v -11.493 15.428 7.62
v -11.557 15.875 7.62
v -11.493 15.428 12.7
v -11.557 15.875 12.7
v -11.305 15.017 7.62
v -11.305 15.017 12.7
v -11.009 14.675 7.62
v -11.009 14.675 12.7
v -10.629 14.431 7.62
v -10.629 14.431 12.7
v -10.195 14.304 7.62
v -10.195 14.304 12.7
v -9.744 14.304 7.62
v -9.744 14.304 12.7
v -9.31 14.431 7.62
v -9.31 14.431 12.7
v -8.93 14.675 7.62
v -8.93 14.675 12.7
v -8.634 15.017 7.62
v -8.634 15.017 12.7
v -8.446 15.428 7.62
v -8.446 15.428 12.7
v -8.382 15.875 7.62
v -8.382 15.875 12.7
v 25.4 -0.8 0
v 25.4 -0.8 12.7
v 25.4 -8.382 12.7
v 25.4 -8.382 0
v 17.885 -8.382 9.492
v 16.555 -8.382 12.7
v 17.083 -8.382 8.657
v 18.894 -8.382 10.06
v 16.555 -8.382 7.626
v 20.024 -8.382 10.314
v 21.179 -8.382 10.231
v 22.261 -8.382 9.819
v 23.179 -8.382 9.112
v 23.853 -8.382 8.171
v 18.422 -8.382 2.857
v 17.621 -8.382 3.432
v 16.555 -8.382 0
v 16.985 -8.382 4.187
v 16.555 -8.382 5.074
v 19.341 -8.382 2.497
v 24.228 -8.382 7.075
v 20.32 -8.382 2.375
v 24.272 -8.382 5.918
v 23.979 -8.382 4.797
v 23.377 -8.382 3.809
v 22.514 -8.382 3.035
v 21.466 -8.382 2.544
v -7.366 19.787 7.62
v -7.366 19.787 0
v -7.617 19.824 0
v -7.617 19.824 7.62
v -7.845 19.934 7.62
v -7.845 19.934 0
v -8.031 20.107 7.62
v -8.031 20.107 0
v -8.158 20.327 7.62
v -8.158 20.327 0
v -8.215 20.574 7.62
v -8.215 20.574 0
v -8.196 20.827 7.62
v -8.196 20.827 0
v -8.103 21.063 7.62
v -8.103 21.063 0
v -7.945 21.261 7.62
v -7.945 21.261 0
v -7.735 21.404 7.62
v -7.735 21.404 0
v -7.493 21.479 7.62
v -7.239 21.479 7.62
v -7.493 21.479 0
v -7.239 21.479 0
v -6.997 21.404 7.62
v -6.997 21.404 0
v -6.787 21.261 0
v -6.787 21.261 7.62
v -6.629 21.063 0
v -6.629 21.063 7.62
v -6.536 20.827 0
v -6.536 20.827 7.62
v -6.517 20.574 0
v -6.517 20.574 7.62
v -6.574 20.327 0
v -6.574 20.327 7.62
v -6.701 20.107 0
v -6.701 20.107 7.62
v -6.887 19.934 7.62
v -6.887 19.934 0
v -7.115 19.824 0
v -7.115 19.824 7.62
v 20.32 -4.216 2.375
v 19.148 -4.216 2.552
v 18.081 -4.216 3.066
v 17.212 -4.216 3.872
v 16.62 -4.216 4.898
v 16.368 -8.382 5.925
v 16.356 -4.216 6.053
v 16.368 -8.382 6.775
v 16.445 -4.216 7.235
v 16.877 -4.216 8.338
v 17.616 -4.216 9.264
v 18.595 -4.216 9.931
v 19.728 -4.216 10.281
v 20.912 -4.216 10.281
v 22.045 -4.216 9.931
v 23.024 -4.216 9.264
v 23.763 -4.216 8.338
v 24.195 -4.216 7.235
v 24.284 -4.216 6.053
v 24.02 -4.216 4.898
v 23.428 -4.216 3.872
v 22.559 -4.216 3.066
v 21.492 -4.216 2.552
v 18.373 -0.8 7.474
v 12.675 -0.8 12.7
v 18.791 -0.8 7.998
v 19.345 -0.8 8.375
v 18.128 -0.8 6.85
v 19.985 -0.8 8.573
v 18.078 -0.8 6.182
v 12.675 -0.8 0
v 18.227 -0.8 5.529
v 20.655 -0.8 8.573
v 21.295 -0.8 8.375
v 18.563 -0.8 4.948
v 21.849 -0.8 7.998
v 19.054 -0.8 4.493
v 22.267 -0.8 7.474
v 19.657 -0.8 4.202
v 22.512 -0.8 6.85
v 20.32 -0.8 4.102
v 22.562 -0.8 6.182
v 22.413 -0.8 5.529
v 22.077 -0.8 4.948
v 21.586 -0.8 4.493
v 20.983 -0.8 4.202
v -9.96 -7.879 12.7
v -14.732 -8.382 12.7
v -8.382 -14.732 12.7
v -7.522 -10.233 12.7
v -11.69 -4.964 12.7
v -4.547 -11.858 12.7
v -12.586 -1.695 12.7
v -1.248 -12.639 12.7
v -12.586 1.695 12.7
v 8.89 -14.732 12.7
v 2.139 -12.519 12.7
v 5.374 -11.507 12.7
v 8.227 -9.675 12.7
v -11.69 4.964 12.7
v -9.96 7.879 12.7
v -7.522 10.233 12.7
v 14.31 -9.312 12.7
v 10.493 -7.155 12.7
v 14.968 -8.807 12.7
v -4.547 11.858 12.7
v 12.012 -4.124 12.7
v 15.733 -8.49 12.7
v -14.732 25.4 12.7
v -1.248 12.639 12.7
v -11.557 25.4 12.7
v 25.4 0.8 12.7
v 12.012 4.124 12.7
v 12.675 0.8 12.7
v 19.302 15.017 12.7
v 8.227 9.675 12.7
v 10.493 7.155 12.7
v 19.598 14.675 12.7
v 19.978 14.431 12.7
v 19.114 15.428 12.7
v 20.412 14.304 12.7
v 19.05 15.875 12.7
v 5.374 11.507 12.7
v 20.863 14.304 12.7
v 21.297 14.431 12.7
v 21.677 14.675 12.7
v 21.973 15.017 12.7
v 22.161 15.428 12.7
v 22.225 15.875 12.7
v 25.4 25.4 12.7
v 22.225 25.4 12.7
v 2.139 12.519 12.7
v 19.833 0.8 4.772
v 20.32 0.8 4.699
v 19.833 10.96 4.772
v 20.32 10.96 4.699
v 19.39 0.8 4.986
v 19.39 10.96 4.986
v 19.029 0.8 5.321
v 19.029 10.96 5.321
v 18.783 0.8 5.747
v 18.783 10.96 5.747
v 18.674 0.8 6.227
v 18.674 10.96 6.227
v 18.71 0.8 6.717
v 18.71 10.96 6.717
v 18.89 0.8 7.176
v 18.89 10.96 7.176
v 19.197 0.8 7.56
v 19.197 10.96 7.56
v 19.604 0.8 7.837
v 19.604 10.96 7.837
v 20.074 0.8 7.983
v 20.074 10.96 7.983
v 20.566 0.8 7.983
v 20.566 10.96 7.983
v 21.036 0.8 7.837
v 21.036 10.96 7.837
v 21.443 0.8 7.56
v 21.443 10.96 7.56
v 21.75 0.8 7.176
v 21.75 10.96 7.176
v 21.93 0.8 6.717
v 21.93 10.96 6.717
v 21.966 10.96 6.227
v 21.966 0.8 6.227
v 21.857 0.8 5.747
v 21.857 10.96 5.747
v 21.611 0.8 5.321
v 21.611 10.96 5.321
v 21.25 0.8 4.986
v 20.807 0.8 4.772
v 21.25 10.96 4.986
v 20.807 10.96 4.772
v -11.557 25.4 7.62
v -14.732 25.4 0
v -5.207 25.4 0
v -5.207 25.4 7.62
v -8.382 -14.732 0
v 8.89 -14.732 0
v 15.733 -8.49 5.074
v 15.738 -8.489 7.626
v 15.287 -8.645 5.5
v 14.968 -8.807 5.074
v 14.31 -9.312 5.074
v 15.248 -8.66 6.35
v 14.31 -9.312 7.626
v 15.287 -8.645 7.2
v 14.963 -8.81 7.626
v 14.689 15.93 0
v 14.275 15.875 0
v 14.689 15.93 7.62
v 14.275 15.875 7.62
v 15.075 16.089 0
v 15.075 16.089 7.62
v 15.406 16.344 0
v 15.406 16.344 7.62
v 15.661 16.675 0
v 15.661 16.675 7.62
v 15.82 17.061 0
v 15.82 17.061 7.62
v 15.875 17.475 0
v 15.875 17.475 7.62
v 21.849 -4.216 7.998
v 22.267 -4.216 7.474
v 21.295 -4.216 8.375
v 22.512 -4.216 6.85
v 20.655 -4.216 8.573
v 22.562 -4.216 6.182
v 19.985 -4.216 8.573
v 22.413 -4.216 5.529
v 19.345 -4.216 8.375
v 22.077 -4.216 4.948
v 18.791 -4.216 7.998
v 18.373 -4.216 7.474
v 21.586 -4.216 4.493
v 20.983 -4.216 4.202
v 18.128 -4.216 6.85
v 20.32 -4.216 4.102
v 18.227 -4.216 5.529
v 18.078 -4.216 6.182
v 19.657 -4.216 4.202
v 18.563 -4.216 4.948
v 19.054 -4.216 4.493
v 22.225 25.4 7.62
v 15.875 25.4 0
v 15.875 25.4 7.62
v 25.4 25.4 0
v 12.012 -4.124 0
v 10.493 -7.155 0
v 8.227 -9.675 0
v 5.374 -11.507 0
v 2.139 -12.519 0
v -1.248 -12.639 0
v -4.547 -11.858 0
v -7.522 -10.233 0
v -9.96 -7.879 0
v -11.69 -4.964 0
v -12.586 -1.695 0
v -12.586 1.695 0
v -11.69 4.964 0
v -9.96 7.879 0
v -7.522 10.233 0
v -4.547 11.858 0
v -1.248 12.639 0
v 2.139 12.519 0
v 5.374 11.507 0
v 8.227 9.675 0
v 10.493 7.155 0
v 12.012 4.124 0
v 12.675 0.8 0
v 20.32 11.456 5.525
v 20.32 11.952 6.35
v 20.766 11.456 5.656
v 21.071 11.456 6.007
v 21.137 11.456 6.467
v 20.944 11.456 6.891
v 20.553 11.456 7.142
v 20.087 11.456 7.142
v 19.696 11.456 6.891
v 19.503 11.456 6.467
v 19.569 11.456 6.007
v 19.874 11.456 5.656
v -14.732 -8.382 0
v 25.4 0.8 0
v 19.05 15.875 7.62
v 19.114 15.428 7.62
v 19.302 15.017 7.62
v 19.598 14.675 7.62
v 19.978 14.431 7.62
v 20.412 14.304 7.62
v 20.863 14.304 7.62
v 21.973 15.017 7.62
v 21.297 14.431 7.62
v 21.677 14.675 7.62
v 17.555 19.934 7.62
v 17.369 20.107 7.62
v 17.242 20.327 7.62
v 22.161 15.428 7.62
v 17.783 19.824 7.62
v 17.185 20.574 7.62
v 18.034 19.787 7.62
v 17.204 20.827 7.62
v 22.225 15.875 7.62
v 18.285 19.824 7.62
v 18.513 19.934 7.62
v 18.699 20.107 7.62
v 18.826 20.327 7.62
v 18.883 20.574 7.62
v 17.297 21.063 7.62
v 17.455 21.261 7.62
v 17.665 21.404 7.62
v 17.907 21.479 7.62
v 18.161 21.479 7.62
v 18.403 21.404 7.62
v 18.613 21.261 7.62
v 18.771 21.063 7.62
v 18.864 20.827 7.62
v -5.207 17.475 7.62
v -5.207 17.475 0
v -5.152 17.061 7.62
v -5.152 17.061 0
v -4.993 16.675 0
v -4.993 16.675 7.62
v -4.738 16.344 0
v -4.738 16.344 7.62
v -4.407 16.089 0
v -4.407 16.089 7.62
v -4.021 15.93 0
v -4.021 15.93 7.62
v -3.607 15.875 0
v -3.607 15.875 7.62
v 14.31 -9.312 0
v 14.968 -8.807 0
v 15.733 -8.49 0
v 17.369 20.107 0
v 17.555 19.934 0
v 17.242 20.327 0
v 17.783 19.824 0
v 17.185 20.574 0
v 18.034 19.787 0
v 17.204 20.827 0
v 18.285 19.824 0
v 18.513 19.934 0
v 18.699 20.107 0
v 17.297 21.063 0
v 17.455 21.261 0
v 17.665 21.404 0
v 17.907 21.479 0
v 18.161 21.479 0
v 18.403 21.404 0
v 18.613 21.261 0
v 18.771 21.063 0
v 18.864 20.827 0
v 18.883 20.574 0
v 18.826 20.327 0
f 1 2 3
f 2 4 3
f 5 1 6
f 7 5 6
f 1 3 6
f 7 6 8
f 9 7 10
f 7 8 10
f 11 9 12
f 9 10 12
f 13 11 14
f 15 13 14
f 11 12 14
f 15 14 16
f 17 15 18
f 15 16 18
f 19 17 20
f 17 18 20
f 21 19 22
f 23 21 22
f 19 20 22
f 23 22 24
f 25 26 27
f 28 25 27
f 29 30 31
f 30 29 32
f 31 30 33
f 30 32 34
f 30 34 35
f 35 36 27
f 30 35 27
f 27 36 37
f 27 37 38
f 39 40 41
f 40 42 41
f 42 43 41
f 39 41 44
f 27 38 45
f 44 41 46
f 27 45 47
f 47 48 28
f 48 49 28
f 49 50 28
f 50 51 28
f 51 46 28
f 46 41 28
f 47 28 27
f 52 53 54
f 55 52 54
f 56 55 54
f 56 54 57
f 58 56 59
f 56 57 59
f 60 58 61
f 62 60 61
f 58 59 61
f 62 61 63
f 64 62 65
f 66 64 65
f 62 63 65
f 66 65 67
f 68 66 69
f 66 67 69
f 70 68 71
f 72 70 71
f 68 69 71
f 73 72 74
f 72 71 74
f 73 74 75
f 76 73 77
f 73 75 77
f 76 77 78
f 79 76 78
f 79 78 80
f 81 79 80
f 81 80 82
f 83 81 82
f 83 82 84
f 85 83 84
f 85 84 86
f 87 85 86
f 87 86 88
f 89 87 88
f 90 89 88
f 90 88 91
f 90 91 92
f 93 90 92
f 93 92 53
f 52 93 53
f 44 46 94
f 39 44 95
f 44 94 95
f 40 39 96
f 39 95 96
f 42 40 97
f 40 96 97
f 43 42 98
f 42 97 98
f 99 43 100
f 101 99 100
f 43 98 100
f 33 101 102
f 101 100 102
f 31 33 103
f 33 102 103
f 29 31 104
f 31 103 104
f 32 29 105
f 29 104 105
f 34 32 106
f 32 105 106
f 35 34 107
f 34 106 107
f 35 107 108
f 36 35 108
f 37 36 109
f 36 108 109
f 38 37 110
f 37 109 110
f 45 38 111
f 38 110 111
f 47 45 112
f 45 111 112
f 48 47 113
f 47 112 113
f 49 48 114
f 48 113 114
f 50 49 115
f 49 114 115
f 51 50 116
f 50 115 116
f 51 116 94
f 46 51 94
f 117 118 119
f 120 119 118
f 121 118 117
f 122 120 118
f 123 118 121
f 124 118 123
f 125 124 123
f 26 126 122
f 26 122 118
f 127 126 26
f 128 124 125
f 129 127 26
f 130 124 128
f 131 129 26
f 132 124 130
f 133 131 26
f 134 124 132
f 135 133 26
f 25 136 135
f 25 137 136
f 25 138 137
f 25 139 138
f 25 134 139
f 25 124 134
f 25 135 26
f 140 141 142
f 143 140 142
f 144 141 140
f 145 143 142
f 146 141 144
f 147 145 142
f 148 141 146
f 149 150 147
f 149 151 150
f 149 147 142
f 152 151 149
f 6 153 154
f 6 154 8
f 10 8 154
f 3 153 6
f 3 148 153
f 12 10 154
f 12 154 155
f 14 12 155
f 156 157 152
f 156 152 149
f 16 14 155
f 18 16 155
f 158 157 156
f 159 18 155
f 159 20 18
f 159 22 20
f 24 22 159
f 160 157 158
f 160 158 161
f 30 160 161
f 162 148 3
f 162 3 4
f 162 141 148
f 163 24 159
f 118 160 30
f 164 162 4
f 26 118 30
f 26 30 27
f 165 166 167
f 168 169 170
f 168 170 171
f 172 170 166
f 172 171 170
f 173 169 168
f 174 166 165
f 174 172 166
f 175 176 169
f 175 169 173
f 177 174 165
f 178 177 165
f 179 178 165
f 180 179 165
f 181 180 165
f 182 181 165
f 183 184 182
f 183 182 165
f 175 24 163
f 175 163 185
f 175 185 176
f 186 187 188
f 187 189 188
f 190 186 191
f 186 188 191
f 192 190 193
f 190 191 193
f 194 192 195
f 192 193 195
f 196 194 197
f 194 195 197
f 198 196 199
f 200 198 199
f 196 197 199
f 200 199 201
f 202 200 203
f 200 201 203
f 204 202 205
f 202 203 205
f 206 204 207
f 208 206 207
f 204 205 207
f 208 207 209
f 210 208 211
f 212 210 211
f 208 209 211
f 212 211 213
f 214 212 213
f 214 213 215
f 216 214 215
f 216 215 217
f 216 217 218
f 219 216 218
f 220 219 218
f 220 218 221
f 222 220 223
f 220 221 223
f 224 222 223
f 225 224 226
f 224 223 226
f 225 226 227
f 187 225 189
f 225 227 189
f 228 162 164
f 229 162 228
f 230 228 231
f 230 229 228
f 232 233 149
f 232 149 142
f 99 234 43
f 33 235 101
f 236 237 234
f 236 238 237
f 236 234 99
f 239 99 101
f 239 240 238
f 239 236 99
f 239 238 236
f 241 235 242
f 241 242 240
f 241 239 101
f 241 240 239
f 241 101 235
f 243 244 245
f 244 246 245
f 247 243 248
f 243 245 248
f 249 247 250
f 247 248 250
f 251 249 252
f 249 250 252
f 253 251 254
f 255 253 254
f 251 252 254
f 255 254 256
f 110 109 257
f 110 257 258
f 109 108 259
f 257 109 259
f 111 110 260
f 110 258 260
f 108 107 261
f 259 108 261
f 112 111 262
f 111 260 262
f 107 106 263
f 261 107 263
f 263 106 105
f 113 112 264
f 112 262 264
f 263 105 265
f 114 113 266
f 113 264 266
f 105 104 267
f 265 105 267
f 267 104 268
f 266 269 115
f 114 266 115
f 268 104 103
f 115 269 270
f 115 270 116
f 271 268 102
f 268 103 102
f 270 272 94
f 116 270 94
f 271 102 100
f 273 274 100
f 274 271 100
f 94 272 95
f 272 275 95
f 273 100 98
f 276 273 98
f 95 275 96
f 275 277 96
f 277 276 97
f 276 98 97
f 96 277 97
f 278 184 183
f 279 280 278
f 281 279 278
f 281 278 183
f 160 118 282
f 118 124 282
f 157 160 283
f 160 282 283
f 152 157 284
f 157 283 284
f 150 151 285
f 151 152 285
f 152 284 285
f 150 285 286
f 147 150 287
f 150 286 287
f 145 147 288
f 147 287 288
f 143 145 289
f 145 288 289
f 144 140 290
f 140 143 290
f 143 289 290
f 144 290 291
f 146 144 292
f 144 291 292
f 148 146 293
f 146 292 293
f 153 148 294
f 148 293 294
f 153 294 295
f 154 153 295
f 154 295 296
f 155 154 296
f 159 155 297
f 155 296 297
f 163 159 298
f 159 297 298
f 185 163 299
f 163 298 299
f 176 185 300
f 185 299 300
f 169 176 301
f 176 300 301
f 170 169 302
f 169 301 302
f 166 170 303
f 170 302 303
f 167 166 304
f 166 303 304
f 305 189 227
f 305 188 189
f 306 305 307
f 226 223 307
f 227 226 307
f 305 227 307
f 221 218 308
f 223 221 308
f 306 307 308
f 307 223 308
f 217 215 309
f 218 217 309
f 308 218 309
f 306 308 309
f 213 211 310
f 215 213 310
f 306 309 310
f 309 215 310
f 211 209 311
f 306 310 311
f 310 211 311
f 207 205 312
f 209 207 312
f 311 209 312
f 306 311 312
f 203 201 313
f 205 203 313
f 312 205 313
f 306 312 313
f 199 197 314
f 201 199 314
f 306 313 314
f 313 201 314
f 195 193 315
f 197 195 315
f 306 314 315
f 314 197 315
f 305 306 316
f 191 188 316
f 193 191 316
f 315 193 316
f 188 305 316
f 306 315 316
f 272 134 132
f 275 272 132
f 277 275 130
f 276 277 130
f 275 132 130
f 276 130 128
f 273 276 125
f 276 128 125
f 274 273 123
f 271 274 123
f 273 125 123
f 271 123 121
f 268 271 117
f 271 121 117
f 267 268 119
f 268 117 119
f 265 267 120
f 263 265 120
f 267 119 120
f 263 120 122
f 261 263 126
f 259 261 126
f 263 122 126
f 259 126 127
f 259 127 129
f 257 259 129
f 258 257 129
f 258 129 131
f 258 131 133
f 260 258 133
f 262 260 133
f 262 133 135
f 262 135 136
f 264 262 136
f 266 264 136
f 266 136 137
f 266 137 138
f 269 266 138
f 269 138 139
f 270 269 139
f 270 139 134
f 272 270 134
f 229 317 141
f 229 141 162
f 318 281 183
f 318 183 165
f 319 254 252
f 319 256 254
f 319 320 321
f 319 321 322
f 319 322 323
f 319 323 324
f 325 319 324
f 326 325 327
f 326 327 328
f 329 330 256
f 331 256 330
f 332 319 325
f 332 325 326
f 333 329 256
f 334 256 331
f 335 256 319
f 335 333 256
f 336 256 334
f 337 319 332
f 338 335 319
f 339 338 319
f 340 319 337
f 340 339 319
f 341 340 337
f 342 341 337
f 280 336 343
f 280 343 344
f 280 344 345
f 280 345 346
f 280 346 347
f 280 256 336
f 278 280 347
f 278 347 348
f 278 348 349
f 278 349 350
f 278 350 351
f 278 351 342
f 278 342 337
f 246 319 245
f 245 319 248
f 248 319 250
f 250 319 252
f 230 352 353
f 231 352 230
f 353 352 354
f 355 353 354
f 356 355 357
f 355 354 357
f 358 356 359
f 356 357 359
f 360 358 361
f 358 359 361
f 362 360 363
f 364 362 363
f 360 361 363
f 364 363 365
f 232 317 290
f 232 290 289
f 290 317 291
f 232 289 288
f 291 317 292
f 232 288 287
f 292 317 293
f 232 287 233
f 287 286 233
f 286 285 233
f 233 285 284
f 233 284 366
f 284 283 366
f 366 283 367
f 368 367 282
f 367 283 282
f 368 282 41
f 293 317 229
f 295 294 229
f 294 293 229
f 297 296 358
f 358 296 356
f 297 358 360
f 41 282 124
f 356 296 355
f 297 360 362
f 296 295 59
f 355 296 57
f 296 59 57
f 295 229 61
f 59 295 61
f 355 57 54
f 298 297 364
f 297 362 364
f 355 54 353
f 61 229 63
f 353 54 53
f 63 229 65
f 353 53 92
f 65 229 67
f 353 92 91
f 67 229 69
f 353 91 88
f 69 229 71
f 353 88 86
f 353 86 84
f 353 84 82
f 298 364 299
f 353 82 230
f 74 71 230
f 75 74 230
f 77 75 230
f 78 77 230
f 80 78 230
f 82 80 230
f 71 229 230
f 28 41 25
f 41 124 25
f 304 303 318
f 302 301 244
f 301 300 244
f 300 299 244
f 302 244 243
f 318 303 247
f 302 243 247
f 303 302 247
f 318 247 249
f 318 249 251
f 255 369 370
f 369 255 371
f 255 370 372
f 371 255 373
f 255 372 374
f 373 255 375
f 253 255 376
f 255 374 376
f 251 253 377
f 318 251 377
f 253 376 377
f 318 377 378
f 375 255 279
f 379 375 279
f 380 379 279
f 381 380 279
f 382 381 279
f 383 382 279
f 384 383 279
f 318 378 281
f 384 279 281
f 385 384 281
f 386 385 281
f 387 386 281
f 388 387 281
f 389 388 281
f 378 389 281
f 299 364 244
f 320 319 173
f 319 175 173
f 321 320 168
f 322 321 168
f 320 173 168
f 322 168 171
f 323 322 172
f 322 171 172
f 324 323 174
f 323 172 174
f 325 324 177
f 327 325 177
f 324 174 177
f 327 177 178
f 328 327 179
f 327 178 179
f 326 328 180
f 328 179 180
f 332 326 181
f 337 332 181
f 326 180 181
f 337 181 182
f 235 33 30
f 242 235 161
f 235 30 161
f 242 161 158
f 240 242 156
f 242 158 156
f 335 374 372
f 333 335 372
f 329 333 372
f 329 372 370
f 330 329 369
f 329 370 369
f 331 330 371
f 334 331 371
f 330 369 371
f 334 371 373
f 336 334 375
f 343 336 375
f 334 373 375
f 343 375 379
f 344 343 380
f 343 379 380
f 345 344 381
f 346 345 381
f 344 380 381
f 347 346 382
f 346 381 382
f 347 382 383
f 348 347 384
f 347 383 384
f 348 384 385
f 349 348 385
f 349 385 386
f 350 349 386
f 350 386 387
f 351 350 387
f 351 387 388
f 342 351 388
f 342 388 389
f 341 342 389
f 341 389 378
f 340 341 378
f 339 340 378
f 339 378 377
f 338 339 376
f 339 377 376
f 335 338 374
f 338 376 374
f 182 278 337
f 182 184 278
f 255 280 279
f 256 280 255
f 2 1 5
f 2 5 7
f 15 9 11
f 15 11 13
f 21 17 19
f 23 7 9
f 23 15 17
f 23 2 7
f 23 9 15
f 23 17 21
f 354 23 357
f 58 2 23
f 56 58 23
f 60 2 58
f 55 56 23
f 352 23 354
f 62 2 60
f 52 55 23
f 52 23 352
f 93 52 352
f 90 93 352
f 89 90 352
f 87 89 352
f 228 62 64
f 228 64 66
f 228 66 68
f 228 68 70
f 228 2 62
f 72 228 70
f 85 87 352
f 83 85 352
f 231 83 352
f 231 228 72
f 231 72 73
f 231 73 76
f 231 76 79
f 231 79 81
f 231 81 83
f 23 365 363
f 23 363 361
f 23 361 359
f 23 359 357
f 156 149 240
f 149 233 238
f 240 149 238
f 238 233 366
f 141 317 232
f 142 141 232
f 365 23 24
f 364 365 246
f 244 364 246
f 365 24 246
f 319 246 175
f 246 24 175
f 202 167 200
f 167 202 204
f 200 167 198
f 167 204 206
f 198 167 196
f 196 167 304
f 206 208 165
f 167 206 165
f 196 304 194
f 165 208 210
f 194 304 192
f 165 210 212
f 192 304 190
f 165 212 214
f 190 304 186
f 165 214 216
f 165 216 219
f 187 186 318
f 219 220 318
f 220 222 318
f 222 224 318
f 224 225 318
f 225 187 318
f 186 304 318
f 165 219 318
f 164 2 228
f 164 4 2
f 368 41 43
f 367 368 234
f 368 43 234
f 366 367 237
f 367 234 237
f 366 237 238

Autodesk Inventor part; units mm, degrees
ref_plane "YZ Plane" through (0, 0, 0) normal (1, 0, 0) x (0, 1, 0)
ref_plane "XZ Plane" through (0, 0, 0) normal (0, 1, 0) x (-1, 0, 0)
ref_plane "XY Plane" through (0, 0, 0) normal (0, 0, 1) x (1, 0, 0)
sketch "Sketch1" plane through (0, 0, 0) normal (0, 0, 1) x (1, 0, 0)
  arc A0 (12.6748, 0.8001) -> (12.6748, -0.8001) centre (0, 0) ccw
  line L0 (-14.732, 25.4) -> (25.4, 25.4)
  line L1 (8.89, -14.732) -> (-8.382, -14.732)
  line L2 (-14.732, -8.382) -> (-14.732, 25.4)
  line L3 (-14.732, -8.382) -> (-8.382, -14.732)
  line L4 (8.89, -14.732) -> (15.24, -8.382)
  line L5 (15.24, -8.382) -> (25.4, -8.382)
  line L6 (-22.7584, 0) -> (33.4264, 0) construction
  line L7 (0, -22.7584) -> (0, 33.4264) construction
  line L8 (12.6748, 0.8001) -> (25.4, 0.8001)
  line L9 (12.6748, -0.8001) -> (25.4, -0.8001)
  line L10 (25.4, 25.4) -> (25.4, 0.8001)
  line L11 (25.4, -0.8001) -> (25.4, -8.382)
  dimension "d0" = 25.4
  dimension "d1" = 14.732
  dimension "d2" = 14.732
  dimension "d4" = 25.4
  dimension "d9" = 1.6002
  dimension "d11" = 45
  dimension "d12" = 25.4
  dimension "d14" = 8.89
  dimension "d15" = 15.24
  dimension "d49" = 45
extrude "Extrusion1" add sketch "Sketch1" along normal blind 12.7
sketch "Sketch2" plane through (0, 0, 12.7) normal (0, 0, 1) x (1, 0, 0)
  line L0 (-14.732, -8.382) -> (-14.732, 25.4) projected
  line L1 (-14.732, 25.4) -> (25.4, 25.4) projected
  line L2 (25.4, 25.4) -> (25.4, 0.8001) projected
  line L3 (-22.7584, 0) -> (33.4264, 0) construction
  line L4 (0, -22.7584) -> (0, 33.4264) construction
  line L5 (-11.557, 25.4) -> (22.225, 25.4)
  line L6 (22.225, 25.4) -> (22.225, 15.875)
  line L7 (19.05, 15.875) -> (-8.382, 15.875)
  line L8 (-11.557, 15.875) -> (-11.557, 25.4)
  arc A0 (-11.557, 15.875) -> (-8.382, 15.875) centre (-9.9695, 15.875) ccw
  arc A1 (19.05, 15.875) -> (22.225, 15.875) centre (20.6375, 15.875) ccw
  point P0 (0, 0)
  dimension "d16" = 3.175
  dimension "d17" = 3.175
  dimension "d18" = 9.525
  dimension "d19" = 3.175
extrude "Extrusion2" cut sketch "Sketch2" against normal blind 5.08
sketch "Sketch3" plane through (0, 0, 7.62) normal (0, 0, 1) x (1, 0, 0)
  line L0 (-11.557, 25.4) -> (22.225, 25.4) projected
  line L1 (-8.382, 15.875) -> (19.05, 15.875) projected
  line L2 (-5.207, 25.4) -> (15.875, 25.4)
  line L3 (15.875, 25.4) -> (15.875, 17.4752)
  line L4 (14.2748, 15.875) -> (-3.6068, 15.875)
  line L5 (-5.207, 17.4752) -> (-5.207, 25.4)
  arc A0 (-5.207, 17.4752) -> (-3.6068, 15.875) centre (-3.6068, 17.4752) ccw
  arc A1 (14.2748, 15.875) -> (15.875, 17.4752) centre (14.2748, 17.4752) ccw
  line L6 (5.334, 25.4) -> (5.334, 15.875) construction
  point P0 (0, 0)
  point P1 (15.875, 15.875)
  dimension "d22" = 1.6002
  dimension "d24" = 6.35
extrude "Extrusion3" cut sketch "Sketch3" against normal through all
sketch "Sketch4" plane through (0, 0, 7.62) normal (0, 0, 1) x (1, 0, 0)
  line L0 (22.225, 25.4) -> (22.225, 15.875) projected
  line L1 (-11.557, 25.4) -> (-11.557, 15.875) projected
  line L2 (-11.557, 20.6375) -> (22.225, 20.6375) construction
  line L3 (5.334, 29.021) -> (5.334, 12.254) construction
  point P0 (0, 0)
  point P1 (-7.366, 20.6375)
  point P2 (18.034, 20.6375)
  point P3 (23.8317, 40.0005)
  point P4 (5.334, 20.6375)
  dimension "d27" = 25.4
hole "Hole1" at (-7.366, 20.6375, 7.62) at (18.034, 20.6375, 7.62) at (23.8317, 40.0005, 7.62) direction (0, 0, -1) diameter 1.7018 end through all
sketch "Sketch5" plane through (15.24, -8.382, 0) normal (0, -1, 0) x (1, 0, 0)
  line L0 (10.16, 12.7) -> (0, 12.7) projected
  line L1 (0, 0) -> (0, 12.7) projected
  line L2 (10.16, 0) -> (0, 0) projected
  line L3 (10.16, 0) -> (10.16, 12.7) projected
  line L4 (5.08, 12.7) -> (5.08, 0) construction
  point P0 (-15.24, 0)
  point P1 (5.08, 6.35)
hole "Hole2" at (20.32, -8.382, 6.35) direction (0, 1, 0) diameter 4.4958 end up to surface counterbore diameter 7.9502 counterbore depth 4.1656 clearance for "Socket Head Cap Screw" size "#8" standard "Ansi Unified Screw Threads"
sketch "Sketch6" plane through (12.6748, 0.8001, 0) normal (0, -1, 0) x (1, 0, 0)
  circle A0 centre (7.6452, 6.35) radius 2.2479 projected
  point P0 (-12.6748, 0)
hole "Hole3" at (20.32, 0.8001, 6.35) direction (0, 1, 0) diameter 3.302 depth 10.16 tip angle 118 thread size "8-32 UNC" class "2B" standard "ANSI Unified Screw Threads"
fillet "Fillet1" radius 3.175 1 edges at (15.24, -8.382, 6.35)
equation "\"d1\" = d2"
equation "\"d14\" = d13"
equation "\"d17\" = d16"
equation "\"d13\" = 8.89"
properties part number "J002637" material "ALUMINUM, 6061-T651"
